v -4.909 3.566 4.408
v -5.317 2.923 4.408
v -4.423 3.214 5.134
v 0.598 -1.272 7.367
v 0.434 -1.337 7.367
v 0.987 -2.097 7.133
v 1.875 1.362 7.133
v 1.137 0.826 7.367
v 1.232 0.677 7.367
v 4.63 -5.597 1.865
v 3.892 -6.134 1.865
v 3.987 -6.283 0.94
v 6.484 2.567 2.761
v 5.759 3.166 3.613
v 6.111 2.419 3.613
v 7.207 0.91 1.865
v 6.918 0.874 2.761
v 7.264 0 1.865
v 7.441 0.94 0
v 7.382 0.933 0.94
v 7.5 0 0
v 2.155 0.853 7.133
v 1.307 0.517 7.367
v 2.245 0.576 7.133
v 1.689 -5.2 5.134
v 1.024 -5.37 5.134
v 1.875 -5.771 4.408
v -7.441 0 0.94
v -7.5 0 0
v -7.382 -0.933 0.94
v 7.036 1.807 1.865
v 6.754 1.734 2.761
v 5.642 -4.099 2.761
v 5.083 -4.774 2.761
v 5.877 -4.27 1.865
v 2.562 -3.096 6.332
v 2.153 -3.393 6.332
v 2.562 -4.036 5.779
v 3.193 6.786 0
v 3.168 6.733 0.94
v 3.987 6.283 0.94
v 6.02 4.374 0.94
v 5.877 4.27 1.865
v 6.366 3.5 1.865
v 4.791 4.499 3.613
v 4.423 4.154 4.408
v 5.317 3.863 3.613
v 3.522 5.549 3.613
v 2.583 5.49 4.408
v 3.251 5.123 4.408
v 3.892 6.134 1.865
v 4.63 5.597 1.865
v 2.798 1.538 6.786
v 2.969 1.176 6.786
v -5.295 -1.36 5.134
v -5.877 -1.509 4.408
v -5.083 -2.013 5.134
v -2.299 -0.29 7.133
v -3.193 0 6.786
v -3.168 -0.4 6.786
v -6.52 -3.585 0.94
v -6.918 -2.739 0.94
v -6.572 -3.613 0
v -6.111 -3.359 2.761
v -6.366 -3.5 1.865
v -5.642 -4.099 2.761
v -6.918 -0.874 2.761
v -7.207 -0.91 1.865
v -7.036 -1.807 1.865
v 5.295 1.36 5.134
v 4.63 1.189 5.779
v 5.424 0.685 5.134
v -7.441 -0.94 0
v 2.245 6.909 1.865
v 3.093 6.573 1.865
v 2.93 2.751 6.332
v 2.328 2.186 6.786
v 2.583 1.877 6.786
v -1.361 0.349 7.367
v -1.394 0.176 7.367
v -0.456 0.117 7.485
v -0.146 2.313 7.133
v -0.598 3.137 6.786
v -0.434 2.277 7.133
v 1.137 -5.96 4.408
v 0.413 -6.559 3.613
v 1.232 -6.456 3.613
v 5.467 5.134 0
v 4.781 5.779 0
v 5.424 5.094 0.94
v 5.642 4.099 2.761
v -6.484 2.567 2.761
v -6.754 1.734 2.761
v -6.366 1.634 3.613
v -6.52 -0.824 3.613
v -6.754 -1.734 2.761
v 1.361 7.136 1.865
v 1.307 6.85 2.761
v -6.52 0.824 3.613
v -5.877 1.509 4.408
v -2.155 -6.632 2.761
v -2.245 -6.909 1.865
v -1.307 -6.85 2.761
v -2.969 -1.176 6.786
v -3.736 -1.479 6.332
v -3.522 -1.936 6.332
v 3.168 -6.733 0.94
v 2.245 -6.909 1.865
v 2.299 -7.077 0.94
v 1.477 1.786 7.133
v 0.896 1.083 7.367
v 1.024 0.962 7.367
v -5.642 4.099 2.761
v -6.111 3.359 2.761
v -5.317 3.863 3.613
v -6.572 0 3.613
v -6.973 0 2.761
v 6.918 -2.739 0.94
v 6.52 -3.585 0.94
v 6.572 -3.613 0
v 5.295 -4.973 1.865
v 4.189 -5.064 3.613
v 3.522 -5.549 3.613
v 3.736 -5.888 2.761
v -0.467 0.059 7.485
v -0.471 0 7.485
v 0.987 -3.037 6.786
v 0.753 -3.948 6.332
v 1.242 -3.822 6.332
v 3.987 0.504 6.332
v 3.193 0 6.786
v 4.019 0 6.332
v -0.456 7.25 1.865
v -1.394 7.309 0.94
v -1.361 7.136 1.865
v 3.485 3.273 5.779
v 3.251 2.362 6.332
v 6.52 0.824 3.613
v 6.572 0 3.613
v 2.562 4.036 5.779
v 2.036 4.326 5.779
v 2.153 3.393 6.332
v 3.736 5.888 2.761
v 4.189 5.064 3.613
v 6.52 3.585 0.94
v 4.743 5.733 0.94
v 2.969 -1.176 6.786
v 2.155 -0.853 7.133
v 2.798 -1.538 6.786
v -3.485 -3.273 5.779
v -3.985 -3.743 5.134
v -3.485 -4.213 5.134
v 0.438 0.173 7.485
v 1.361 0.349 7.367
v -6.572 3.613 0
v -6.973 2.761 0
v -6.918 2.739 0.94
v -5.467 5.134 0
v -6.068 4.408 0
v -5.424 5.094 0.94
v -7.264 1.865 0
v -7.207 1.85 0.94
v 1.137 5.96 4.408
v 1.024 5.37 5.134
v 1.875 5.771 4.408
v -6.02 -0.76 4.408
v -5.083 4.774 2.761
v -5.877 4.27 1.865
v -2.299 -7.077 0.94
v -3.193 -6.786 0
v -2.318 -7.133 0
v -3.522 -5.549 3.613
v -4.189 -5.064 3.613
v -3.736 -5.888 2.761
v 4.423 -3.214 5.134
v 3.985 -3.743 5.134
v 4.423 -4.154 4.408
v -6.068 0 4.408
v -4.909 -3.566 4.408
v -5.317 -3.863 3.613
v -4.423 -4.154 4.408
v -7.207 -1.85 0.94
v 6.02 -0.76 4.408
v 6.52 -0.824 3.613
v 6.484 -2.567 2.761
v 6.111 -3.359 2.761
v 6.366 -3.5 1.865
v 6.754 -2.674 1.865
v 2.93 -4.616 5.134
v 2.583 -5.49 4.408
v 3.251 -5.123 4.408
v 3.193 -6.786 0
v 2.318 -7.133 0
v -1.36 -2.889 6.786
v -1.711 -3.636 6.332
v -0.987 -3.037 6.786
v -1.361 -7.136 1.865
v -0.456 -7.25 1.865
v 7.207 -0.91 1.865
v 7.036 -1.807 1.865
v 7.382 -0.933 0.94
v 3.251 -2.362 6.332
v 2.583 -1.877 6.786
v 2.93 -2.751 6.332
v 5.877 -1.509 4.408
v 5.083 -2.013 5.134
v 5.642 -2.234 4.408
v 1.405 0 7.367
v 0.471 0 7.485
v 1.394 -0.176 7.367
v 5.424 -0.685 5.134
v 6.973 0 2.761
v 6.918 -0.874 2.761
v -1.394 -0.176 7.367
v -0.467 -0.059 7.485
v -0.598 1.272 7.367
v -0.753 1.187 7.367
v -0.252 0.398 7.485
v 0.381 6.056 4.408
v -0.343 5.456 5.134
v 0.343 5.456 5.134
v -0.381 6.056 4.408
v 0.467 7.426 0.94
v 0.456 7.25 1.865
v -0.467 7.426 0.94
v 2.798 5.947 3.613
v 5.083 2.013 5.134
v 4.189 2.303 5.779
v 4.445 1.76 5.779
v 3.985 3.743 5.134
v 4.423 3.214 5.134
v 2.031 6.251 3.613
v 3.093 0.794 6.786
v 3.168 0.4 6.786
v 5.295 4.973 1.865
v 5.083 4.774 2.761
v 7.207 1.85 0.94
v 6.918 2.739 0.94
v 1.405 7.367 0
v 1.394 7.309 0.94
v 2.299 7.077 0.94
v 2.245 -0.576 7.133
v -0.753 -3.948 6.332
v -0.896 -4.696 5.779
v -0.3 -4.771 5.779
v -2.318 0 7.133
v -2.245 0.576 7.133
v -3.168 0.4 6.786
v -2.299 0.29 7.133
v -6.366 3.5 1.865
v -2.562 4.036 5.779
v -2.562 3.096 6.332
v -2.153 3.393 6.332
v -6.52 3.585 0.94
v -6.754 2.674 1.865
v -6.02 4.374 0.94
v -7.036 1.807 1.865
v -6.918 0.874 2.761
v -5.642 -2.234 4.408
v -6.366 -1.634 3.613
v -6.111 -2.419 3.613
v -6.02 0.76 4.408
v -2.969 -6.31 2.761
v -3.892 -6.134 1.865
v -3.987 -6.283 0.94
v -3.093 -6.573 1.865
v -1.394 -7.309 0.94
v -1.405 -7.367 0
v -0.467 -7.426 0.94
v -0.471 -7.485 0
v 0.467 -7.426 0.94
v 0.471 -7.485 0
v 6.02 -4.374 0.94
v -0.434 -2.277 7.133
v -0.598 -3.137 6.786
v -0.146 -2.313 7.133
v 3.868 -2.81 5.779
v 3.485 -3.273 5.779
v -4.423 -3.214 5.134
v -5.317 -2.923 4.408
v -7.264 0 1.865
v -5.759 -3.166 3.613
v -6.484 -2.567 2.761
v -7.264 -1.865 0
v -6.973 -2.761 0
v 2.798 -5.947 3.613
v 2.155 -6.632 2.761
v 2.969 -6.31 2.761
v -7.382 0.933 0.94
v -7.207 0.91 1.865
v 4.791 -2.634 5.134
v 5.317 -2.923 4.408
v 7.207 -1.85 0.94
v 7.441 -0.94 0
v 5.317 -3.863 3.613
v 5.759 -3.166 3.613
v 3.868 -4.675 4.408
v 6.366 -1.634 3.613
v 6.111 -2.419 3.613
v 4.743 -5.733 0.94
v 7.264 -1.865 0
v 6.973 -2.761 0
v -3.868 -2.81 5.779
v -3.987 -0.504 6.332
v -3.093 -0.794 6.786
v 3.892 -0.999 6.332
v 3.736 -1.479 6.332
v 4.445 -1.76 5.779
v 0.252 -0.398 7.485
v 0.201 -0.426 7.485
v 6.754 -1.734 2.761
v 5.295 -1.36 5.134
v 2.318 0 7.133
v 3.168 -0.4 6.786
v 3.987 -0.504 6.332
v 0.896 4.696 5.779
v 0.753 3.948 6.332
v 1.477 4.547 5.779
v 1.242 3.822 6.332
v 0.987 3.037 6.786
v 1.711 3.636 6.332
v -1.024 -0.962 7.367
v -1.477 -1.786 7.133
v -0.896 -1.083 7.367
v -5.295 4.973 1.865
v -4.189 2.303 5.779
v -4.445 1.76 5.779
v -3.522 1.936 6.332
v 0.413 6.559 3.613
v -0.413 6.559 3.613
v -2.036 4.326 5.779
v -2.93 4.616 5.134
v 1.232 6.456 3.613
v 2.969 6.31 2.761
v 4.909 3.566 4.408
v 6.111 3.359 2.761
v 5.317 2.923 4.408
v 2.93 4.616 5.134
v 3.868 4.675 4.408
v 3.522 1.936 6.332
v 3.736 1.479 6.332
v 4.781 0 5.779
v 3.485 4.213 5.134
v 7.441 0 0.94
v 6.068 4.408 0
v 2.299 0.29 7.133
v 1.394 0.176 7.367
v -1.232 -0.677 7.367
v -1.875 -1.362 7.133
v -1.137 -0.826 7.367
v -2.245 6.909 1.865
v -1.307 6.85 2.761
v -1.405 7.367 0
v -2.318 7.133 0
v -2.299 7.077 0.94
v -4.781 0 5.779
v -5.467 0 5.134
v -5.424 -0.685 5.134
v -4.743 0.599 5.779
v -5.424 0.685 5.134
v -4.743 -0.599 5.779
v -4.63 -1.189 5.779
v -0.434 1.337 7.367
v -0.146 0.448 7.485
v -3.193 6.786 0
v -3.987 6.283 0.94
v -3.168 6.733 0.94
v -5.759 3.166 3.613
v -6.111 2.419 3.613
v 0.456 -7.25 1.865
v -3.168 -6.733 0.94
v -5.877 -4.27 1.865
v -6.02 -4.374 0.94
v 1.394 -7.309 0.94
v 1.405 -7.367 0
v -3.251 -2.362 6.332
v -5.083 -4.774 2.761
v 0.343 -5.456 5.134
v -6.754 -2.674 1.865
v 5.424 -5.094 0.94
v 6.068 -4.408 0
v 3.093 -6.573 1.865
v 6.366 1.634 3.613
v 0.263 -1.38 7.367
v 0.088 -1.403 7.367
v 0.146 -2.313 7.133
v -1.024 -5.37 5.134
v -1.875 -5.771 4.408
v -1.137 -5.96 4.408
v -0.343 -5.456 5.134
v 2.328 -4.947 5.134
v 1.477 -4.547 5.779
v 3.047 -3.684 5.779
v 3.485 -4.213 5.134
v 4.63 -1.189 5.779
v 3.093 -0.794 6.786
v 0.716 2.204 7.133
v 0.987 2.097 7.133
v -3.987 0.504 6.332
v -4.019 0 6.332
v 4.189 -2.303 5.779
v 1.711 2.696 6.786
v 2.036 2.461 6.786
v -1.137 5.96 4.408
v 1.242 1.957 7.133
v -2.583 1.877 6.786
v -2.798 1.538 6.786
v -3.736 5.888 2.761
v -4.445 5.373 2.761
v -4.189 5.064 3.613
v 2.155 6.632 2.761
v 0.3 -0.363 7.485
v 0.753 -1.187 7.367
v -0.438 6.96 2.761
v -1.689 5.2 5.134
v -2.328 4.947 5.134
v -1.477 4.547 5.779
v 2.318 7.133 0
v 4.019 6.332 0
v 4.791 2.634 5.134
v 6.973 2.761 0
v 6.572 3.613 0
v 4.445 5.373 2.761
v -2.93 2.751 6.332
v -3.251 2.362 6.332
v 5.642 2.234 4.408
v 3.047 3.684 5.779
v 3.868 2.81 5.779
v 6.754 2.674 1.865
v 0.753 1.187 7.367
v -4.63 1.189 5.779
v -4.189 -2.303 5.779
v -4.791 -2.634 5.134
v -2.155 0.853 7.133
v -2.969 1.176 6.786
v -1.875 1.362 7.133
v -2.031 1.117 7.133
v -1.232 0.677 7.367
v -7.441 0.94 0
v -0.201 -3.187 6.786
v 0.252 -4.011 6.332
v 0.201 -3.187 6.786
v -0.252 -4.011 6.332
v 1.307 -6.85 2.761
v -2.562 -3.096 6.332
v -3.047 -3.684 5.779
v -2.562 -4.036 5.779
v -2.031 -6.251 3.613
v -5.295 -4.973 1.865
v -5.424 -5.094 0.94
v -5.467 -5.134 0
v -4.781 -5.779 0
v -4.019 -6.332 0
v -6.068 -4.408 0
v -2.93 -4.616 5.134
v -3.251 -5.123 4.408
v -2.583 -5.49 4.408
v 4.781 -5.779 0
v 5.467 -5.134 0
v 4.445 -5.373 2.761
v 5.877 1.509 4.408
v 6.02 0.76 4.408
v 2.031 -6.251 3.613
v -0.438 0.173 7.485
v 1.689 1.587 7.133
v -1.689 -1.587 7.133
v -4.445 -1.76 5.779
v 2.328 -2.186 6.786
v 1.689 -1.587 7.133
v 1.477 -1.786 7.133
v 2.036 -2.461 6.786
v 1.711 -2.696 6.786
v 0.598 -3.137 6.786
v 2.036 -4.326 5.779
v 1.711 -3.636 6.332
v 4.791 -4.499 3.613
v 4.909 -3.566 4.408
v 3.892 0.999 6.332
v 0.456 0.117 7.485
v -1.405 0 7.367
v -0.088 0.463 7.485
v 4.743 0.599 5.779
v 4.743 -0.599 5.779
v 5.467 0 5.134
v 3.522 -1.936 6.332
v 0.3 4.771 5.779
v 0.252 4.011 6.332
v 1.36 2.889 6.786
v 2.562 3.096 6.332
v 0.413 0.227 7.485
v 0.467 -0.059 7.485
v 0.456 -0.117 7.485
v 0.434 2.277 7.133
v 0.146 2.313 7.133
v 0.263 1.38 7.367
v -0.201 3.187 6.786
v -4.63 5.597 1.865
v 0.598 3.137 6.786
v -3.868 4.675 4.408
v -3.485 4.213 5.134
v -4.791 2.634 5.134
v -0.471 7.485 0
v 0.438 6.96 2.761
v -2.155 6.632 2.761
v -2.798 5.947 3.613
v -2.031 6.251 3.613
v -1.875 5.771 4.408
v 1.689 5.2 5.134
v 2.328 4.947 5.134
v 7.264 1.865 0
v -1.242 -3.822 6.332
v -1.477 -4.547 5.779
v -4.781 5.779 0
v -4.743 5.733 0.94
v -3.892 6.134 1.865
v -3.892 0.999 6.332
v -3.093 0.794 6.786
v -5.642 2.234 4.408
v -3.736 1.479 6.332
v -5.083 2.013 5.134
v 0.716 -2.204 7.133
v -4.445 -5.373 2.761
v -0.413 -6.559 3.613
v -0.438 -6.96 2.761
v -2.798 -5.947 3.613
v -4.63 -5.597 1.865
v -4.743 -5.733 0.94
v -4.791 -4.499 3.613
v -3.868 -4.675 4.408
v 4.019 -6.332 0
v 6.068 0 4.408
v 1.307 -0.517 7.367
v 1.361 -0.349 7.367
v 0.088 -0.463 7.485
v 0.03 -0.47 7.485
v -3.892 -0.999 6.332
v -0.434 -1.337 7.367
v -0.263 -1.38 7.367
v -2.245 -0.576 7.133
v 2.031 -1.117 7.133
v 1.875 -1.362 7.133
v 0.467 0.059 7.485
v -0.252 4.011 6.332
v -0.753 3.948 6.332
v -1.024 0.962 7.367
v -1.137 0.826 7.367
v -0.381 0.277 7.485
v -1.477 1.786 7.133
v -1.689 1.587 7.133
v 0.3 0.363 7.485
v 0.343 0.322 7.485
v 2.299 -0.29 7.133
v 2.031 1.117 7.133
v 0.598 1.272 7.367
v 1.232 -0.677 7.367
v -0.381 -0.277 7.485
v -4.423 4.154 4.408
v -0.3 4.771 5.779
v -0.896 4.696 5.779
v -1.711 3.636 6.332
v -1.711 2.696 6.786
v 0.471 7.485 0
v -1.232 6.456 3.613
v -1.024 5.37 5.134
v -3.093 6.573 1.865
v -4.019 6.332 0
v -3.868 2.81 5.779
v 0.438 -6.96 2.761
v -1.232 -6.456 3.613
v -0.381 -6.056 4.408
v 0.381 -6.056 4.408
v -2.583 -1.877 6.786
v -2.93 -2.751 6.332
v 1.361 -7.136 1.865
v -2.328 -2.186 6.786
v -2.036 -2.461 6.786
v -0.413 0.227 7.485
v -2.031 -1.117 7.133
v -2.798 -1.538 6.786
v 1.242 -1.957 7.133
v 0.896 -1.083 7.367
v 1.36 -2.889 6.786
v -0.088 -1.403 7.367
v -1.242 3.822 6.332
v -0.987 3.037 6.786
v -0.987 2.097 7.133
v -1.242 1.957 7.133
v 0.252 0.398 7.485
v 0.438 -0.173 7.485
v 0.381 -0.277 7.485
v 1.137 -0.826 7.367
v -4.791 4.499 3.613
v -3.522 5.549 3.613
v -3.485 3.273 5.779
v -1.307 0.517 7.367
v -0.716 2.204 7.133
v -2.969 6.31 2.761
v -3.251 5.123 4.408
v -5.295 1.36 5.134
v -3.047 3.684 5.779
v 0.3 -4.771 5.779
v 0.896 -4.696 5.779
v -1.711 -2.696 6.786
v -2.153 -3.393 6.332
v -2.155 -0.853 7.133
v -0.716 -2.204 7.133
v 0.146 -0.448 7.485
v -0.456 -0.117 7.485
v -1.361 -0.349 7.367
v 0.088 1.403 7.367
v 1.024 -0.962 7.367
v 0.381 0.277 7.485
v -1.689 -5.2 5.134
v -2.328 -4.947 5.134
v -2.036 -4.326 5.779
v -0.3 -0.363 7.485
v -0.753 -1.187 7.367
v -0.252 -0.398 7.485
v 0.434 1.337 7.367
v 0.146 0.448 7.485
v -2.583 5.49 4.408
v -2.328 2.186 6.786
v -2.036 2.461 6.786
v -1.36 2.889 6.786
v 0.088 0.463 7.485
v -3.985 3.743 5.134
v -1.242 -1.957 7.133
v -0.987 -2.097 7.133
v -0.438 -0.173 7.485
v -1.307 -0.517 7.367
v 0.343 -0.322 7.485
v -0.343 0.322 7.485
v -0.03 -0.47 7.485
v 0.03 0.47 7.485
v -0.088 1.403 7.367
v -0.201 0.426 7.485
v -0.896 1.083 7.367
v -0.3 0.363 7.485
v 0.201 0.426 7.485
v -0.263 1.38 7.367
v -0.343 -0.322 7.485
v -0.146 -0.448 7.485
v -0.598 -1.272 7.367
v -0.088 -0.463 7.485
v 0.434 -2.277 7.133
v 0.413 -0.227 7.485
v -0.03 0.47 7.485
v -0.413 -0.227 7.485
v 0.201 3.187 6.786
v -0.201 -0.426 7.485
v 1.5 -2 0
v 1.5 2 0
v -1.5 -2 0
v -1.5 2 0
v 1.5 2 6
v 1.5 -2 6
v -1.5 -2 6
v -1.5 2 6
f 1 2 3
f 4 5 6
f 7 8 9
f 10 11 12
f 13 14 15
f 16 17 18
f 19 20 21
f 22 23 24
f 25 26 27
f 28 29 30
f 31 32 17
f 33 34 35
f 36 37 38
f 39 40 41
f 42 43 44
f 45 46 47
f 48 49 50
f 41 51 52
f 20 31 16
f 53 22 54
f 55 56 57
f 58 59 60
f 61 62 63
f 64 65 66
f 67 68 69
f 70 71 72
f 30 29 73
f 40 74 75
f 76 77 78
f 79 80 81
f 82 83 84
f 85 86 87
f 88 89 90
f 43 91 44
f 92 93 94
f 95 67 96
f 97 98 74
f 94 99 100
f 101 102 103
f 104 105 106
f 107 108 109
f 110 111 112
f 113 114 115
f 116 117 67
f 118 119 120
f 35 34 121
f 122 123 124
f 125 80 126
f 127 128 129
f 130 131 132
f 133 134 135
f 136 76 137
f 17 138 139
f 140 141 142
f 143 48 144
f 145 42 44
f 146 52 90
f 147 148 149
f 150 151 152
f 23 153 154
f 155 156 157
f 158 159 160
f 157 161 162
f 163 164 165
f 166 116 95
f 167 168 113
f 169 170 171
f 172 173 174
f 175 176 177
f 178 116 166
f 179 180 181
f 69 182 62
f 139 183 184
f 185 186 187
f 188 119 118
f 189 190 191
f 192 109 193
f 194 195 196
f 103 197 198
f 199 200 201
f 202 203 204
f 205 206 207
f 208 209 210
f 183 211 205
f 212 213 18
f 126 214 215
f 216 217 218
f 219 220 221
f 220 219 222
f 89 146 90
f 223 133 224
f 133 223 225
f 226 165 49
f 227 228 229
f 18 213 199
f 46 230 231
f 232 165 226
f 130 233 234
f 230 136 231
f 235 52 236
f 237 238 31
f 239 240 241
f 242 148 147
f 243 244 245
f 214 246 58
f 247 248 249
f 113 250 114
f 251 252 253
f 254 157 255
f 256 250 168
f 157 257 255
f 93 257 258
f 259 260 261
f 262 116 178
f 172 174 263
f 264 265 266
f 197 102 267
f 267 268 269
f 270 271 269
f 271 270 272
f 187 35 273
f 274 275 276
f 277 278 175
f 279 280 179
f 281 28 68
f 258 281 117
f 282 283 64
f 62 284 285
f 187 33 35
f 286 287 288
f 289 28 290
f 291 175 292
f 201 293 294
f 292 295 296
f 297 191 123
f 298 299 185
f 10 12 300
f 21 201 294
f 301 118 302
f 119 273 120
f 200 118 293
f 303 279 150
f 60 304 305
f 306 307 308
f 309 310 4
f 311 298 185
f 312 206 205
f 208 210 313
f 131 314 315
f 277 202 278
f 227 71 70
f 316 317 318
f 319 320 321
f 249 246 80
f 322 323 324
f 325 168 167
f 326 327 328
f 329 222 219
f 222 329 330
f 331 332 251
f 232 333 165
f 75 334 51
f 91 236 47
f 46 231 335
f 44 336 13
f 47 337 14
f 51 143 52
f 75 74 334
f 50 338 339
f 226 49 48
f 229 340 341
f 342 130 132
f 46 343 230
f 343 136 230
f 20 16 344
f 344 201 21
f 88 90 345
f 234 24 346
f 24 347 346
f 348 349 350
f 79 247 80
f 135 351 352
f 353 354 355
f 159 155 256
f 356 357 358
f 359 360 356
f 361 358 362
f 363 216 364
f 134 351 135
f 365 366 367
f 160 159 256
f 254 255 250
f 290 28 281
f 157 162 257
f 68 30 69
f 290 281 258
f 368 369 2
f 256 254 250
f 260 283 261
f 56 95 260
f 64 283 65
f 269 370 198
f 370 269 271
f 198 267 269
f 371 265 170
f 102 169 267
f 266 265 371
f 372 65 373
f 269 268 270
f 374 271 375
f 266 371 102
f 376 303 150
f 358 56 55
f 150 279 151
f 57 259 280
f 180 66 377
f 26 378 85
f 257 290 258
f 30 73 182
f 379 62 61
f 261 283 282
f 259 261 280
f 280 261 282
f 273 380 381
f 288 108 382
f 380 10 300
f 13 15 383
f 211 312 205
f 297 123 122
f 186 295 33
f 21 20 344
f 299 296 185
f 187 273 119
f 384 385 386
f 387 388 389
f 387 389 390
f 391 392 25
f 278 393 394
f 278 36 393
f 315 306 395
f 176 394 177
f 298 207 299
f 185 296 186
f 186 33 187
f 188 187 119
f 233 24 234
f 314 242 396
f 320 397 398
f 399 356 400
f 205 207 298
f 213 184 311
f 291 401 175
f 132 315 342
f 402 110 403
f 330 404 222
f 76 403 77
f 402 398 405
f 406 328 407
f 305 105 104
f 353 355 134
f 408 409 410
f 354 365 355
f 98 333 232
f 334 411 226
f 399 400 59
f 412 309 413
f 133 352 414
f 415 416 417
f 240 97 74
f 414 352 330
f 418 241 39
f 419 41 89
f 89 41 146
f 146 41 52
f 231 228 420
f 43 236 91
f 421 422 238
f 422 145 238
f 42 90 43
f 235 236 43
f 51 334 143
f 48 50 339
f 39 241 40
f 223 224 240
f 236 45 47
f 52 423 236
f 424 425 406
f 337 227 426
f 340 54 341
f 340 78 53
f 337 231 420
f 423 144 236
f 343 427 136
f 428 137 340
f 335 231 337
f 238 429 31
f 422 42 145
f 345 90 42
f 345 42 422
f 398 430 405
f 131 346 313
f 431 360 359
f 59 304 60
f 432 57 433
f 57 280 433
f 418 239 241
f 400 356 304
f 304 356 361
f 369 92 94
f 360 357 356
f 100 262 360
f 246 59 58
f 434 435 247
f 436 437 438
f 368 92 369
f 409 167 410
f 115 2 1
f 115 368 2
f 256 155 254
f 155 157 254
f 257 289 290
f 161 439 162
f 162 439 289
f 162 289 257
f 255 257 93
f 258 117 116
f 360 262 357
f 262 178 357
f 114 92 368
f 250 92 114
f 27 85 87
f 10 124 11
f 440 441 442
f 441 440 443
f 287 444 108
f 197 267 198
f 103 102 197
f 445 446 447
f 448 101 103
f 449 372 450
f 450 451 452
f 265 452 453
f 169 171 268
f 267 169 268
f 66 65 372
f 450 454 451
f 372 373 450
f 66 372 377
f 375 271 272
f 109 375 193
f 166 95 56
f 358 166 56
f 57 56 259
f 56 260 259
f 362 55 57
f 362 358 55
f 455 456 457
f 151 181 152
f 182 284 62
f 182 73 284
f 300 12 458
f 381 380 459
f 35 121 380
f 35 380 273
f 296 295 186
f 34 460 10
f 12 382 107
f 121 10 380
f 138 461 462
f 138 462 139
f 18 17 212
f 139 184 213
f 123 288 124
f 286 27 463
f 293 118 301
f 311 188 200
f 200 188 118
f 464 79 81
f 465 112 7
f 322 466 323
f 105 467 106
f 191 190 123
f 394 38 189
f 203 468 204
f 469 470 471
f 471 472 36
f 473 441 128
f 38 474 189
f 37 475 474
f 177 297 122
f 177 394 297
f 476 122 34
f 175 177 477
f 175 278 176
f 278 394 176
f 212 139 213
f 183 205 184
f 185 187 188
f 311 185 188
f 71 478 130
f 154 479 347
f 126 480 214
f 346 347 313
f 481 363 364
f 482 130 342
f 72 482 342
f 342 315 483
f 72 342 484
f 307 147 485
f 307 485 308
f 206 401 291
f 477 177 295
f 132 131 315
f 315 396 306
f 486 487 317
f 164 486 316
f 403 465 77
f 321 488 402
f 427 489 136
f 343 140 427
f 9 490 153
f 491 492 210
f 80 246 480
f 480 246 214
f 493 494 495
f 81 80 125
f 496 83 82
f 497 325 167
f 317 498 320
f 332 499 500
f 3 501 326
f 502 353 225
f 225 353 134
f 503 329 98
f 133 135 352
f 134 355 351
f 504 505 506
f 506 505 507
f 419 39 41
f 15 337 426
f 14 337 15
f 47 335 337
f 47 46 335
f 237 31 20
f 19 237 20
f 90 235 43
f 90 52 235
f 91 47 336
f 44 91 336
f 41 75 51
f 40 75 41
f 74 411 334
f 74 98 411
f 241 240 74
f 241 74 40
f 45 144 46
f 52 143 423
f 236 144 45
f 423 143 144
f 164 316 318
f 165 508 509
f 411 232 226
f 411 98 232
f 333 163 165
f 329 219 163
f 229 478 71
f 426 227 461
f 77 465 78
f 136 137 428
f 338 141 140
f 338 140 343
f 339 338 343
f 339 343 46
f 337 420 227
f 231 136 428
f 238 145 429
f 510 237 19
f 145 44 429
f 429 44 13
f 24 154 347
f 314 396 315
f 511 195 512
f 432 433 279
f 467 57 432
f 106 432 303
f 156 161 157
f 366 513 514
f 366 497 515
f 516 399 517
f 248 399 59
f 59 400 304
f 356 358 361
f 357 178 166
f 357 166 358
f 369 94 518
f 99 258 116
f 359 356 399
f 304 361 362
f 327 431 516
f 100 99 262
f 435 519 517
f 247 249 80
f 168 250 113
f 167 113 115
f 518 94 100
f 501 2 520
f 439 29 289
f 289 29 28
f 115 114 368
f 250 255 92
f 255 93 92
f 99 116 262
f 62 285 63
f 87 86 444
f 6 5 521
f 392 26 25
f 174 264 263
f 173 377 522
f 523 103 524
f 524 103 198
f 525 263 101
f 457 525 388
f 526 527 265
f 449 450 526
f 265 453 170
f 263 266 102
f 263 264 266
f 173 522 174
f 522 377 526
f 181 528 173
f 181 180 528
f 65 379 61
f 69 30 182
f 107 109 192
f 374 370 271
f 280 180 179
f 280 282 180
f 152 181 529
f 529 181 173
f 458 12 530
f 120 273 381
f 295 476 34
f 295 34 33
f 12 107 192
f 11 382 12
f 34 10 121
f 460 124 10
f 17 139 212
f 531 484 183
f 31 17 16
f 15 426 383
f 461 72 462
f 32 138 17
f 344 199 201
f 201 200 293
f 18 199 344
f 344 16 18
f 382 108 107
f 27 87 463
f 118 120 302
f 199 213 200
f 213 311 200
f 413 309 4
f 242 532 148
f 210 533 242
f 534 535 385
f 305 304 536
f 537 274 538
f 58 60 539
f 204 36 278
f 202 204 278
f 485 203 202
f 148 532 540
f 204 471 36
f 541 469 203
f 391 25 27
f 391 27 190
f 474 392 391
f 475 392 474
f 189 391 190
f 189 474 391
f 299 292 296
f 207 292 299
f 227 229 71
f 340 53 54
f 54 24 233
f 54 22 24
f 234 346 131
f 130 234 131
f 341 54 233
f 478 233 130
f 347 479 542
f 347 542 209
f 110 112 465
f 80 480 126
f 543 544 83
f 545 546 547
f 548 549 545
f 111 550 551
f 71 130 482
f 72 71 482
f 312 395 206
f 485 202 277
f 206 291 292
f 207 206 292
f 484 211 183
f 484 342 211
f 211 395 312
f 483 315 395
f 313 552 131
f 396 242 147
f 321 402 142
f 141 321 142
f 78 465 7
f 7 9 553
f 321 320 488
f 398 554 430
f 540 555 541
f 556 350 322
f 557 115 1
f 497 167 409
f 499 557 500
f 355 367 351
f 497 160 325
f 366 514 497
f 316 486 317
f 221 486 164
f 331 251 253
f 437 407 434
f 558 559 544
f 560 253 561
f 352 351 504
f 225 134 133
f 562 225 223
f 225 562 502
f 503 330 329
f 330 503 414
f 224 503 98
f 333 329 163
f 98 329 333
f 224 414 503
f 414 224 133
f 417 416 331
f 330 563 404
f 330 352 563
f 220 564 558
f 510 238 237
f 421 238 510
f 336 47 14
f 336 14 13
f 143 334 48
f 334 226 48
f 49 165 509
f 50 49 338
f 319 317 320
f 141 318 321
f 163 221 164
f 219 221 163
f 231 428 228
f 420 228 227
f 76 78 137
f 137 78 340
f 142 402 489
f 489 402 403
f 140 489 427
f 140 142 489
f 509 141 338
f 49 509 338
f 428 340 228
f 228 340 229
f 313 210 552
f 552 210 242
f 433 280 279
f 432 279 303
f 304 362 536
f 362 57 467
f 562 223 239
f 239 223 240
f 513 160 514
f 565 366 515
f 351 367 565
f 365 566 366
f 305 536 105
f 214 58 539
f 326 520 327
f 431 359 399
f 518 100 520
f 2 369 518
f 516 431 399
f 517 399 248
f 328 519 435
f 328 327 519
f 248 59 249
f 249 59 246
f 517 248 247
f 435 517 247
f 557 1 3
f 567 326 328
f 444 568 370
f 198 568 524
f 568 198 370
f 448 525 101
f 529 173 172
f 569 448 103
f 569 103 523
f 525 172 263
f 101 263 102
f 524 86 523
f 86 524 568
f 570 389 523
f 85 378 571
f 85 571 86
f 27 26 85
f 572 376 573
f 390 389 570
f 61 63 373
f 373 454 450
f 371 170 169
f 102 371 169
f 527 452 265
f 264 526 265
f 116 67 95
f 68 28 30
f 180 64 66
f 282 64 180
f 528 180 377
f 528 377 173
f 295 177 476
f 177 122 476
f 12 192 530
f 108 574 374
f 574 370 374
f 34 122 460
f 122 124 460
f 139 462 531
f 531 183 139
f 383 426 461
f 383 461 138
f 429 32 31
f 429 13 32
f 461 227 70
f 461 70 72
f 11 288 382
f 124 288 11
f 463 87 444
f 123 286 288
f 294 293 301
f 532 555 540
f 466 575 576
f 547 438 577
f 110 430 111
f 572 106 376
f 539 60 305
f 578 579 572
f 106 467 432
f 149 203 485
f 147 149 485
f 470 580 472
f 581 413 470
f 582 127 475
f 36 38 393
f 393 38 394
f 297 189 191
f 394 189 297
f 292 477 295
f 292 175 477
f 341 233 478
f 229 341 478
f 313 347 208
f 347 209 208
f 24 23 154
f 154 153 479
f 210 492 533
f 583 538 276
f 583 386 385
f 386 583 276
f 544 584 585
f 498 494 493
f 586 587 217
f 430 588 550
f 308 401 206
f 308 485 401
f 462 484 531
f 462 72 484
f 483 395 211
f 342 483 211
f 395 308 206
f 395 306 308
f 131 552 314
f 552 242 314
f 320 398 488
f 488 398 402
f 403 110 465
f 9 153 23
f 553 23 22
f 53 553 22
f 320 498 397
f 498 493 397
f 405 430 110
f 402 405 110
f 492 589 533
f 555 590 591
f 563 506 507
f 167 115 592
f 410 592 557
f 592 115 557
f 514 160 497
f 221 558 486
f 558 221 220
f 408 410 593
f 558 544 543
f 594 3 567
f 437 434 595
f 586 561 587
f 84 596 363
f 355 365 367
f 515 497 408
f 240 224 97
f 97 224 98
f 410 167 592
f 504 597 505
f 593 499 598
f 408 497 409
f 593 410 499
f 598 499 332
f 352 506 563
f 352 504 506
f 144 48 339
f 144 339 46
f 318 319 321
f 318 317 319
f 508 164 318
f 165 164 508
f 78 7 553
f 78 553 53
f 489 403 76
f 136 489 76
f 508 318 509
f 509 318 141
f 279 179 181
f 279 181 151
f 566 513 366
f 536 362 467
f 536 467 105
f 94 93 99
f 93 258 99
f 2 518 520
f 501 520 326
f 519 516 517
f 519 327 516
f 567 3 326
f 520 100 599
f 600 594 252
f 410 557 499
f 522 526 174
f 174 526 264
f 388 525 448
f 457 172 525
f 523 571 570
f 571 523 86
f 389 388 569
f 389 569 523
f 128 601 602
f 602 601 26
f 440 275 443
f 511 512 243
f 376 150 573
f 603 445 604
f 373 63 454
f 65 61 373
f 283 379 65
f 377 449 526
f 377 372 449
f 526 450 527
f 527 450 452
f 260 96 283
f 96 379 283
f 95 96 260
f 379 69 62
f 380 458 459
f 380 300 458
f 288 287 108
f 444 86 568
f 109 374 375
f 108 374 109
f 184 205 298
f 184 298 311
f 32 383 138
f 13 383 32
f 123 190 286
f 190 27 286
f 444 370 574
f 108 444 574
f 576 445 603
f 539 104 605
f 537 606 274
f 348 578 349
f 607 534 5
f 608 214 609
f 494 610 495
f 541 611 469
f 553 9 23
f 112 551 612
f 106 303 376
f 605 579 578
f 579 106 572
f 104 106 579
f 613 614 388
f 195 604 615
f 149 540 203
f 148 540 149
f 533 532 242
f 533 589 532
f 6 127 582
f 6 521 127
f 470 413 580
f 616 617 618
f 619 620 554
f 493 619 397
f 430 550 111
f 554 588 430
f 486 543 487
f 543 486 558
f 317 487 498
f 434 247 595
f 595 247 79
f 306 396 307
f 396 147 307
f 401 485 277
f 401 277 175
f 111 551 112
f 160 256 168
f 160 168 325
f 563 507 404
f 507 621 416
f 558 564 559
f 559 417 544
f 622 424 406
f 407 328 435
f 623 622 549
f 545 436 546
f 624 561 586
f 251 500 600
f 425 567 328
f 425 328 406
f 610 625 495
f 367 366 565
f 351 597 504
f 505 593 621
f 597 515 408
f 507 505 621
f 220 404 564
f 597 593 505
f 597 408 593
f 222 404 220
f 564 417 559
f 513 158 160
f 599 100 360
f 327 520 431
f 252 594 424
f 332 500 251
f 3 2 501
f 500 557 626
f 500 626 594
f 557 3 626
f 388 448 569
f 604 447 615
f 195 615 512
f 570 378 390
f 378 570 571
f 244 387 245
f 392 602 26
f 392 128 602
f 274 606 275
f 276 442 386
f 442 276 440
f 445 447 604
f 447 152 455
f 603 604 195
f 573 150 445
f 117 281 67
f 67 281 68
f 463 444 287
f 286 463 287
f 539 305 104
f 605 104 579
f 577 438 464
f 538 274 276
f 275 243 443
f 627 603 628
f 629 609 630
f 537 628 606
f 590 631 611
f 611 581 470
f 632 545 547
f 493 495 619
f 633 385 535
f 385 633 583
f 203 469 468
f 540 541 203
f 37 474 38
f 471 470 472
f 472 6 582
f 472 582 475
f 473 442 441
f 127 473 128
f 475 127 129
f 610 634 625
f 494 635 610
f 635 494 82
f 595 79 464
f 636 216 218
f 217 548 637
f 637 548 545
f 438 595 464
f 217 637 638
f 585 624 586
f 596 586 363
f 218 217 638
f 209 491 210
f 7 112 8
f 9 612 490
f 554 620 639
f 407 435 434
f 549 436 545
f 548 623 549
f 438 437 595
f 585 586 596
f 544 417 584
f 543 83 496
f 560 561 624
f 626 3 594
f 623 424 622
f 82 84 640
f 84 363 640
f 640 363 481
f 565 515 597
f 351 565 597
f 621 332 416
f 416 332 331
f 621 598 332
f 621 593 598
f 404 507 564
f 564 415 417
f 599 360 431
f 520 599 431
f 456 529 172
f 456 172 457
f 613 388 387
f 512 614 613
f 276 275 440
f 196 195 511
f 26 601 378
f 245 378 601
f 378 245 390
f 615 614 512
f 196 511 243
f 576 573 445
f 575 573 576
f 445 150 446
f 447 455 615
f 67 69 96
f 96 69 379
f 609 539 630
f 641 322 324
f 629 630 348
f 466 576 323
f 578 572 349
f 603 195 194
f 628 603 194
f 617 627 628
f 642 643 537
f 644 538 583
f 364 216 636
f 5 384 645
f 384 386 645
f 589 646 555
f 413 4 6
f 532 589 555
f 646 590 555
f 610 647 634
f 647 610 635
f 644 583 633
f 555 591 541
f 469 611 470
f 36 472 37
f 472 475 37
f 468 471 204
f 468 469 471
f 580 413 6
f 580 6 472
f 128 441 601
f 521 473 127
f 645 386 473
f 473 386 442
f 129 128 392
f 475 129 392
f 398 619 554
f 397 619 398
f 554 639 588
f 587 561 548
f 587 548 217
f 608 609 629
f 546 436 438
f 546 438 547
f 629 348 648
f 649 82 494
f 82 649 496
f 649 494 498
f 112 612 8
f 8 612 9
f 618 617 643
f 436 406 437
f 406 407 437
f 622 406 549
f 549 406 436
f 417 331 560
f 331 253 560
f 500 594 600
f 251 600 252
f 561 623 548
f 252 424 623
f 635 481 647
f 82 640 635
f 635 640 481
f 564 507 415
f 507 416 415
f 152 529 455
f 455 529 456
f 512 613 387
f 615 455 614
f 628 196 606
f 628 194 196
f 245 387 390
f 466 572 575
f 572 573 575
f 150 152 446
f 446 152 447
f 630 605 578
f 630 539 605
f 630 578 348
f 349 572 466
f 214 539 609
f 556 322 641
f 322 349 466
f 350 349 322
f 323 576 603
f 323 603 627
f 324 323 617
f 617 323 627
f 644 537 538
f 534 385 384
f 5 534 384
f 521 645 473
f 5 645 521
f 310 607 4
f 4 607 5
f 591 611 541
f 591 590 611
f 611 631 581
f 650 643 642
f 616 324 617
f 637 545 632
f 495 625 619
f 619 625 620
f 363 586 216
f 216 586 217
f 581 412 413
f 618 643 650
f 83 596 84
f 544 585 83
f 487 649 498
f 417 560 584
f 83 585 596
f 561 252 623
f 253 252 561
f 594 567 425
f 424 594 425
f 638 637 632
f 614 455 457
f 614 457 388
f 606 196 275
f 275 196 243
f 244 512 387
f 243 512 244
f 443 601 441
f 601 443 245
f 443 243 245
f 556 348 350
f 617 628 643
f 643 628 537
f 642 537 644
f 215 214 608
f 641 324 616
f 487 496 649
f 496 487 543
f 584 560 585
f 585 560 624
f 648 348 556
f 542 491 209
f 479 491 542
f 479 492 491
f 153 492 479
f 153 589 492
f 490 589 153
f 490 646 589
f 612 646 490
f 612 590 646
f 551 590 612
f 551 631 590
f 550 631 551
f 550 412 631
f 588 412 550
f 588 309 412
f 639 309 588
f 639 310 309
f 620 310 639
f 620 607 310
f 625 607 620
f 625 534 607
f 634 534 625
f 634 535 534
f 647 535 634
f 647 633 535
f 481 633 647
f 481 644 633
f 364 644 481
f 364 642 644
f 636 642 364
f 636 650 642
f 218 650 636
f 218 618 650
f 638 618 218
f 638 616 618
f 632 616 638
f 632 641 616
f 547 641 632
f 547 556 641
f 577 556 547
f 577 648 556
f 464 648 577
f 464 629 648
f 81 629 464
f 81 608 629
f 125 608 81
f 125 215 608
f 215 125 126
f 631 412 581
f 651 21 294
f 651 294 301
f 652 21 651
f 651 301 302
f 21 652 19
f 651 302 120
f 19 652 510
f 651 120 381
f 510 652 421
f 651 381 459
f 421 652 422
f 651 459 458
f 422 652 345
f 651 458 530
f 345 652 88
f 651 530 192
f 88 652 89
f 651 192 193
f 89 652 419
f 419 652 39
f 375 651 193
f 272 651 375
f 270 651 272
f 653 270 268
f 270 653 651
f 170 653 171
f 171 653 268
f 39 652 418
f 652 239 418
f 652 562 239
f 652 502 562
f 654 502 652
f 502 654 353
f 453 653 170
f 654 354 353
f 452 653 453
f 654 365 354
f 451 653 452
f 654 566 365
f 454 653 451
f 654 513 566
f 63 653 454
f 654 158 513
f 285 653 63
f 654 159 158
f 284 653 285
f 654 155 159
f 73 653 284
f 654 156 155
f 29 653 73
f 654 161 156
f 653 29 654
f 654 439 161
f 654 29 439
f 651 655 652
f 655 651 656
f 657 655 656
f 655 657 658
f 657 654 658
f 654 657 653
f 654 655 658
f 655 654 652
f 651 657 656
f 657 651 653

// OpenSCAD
///////////////////
///   GO CASE   ///
///
/// Designed by Chris Caswell
///  3D Central 
///  info@3dcentralva.com
/// 
/// Intention is for this project to be Open Hardware
///  http://www.oshwa.org/definition/


// This is where you put the length of your phone, in millimeters
phone_l = 139.1;
// This is where you put the width of your phone, in millimeters
phone_w = 68.5; // Add ~3mm tolerance to your measurements to account for buttons
// This is where you put the thickness of your phone, in millimeters
phone_d = 7.8;
// This measures where the camera window starts, from left to right, in millimeters
camera_x = 10.2; // Measuring from the top left of phone, to the top left corner of where camera hole should be
// This measures where the camera window starts, from top to bottom, in millimeters
camera_y = 2.6; // "X" measuring left to right, "Y" measuring up and down
// This measures the width of the camera window from left to right, in millimeters
camera_w = 22; // Width and Length of camera hole
// This measures the length of the camera window from top to bottom, in millimeters
camera_l = 8;
// This determines the width of the aimer! It will also change the cutout in the cover. Cool, right?
aimer_w = 15; // width of finger aimer
// You can put your custom text here, and it will appear on the bottom interior of the case
custom_text = "iPhone 6";


part = "button"; // [case_top:Case Top,case_bottom:Case Bottom,case_lid:Case Lid,lock_pin:Latching slide switch,button:Button,aimer_hinge:Aimer Hinge,hinge_pin:Hinge Pin]

if(part == "assembly") {
    assembly();
}
else if(part == "aimer_hinge") {
    aimer_hinge(is_open = true);
}
else if(part == "case_top") {
    translate([0,0,phone_l/2+rounding+wall_th/2]) rotate([-90,0,0]) case_top();
}
else if(part == "case_bottom") {
    translate([0,0,phone_l/2+rounding+wall_th/2]) rotate([90,0,0]) case_bottom();
}
else if(part == "case_lid") {
    translate([0,0,13]) rotate([0,180,0]) case_lid();
}
else if(part == "hinge_pin") {
    hinge_pin();
}
else if(part == "lock_pin") {
    translate([0,0,1]) rotate([0,-90,0]) lock_pin();
}
else if(part == "button") {
    button();
}


/* [Hidden] */

// General Parameters
wall_th = 3;
rounding = 2; // minkowski rounding
phone_tol = 0.3; // extra spacing around phone
$fn = 30; // smoothness
volume_l = 30; // Originally location of slot for volume controls
volume_y = 10; // Now 
button_d = 15;
throw_dist = 10; // distance slide switch moves

// Hinge Parameters
pin_l = 30;
pin_d = 8;
tol = 0.35; // tolerance on hinge

// Global constants
sqrt2 = 1.41421356237;
magnet_d = 7;
magnet_h = 2.5;


// All components, in the right place relative to one another
module assembly() {
    //translate([0,-throw_dist,0]) 
    union() {
    translate([-phone_w/2+2-1,phone_l/2-button_d-wall_th+throw_dist-3.5-2,phone_d/2+wall_th*3-5.5])  lock_pin();
    translate([-phone_w/2+2-1+3,phone_l/2-button_d-wall_th+throw_dist+1-2,phone_d/2+wall_th*3-5.5+5])  button();
    }
    //intersection() {
    case_top();
  // translate([-phone_w/2+2-1,phone_l/2-15+4,phone_d/2+wall_th*3-5.5+4]) cube([30,30,80], center=true);
    //}
    //translate([0,-5,0]) 
    case_bottom();
    translate([phone_w+pin_l+pin_d+wall_th,0,15]) rotate([0,180,0]) translate([-1,0,0]) 
    translate([0,0,-1+10]) case_lid();
    translate([phone_w/2+pin_l*3/4-1.5,pin_d*4.5,-pin_d/2]) rotate([0,0,0]) hinge_pin();
    translate([phone_w/2+pin_l*3/4-1.5,-pin_d*6,-pin_d/2]) rotate([0,0,0]) hinge_pin();
    translate([phone_w/2+pin_l*3/4-1.5,-pin_d*0,-pin_d/2]) rotate([0,0,180]) 
    aimer_hinge(is_open = true);
    //lock_pin();
    //translate([10,0,0])  lock_pin_hole();
}


// Main phone case module, where the phone sits
module phone_case() {
    echo (custom_text);
    difference() {
        minkowski() {
            translate([pin_l/6-magnet_d/2,0,wall_th/2-wall_th/2]) 
                cube([phone_w+wall_th+pin_l/3+magnet_d/2, phone_l+wall_th, phone_d+wall_th*4], center=true);
            sphere(r=rounding);
        }
        // main phone cavity
        translate([0,0,0]) cube([phone_w+phone_tol, phone_l+phone_tol, phone_d+phone_tol*2+1], center=true);
        // lock pin hole
        //translate([-phone_w/2+2-1,phone_l/2-throw_dist*2,phone_d/2+wall_th*3-5.5]) lock_pin_hole();
        translate([-phone_w/2+2-1+3,phone_l/2-volume_l/2+throw_dist/2-4,phone_d/2+wall_th*3-5.5+0.25]) lock_pin_hole();
        // camera hole
        translate([phone_w/2-camera_x-camera_w/2,phone_l/2-camera_y-camera_l/2,-phone_d*4]) 
            cube([camera_w,camera_l,phone_d*8],center=true);
        difference() {
            translate([phone_w/2-camera_x-camera_w/2,phone_l/2-camera_y-camera_l,-phone_d*4]) // taper
                rotate([0,0,45]) cube([camera_w*sqrt2/2,camera_w*sqrt2/2,phone_d*8],center=true);
            translate([phone_w/2-camera_x-camera_w/2,phone_l/2-camera_y,-phone_d*4]) 
                cube([camera_w,camera_l*2,phone_d*10],center=true);
        }
        // power plug
        translate([0,-phone_l/2,phone_d-wall_th*0.5]) cube([20,20,phone_d*2.5], center=true);
        // volume buttons
        translate([-phone_w/2-20/2,phone_l/2-volume_y-volume_l,phone_d-wall_th*2]) 
            cube([20,volume_l,phone_d*4], center=true) ;
        // hinge pin holes
        translate([phone_w/2+pin_l*3/4-2,pin_d*4.5,-pin_d/2]) hinge_pin_holes();
        translate([phone_w/2+pin_l*3/4-2,-pin_d*0,-pin_d/2]) rotate([0,0,180])  hinge_pin_holes();
        translate([phone_w/2+pin_l*3/4-2,-pin_d*6,-pin_d/2]) hinge_pin_holes();
        // magnet holes
        translate([-phone_w/2-magnet_d*0.66,0,2]) cylinder(r=magnet_d/2,h=magnet_h,center=true);
        translate([-phone_w/2-magnet_d*0.66,-phone_l/3,2]) cylinder(r=magnet_d/2,h=magnet_h,center=true);
        // code for 45 degree angle cutaway at top of phone, and top
        translate([0,0,1]) 
        union() {
            translate([0,-phone_l/2-volume_y-volume_l/2,(10+wall_th)/2]) 
                cube([phone_w*2,phone_l*2,phone_d+2], center=true);
            translate([-phone_w/2+button_d*1.5+2.5,phone_l/2-button_d*1.5-wall_th+3,(10+wall_th*3)/2]) 
                rotate([0,0,55])
                cube([button_d*sqrt2+2,button_d*sqrt2+2,phone_d*2+3], center=true);
            translate([button_d*2,phone_l/2-26.5,(10+wall_th)/2]) 
                cube([phone_w+wall_th*4+rounding*2,40,phone_d+2], center=true);
        }
        translate([0,-phone_l/2+10,-phone_d])  linear_extrude(4) text(custom_text,halign="center",valign="center");
    }       
}


// Magnetic latching lid which clamshells over phone
module case_lid() {
    intersection () {
        difference() {
            // main outer case
            minkowski() {
                translate([pin_l/6-magnet_d/2,0,0]) 
                    cube([phone_w+wall_th+pin_l/3+magnet_d/2, phone_l+wall_th, 12+wall_th*3], center=true); // 12 from 13
                sphere(r=rounding);
            }
            // main phone cavity
            cube([phone_w+phone_tol, phone_l+phone_tol, phone_d], center=true);
            // hinge pin holes
           translate([phone_w/2+pin_l*3/4-2,pin_d*4.5,13/2+3])  rotate([0,180,0]) hinge_pin_holes();
           translate([phone_w/2+pin_l*3/4-2,-pin_d*6,13/2+3]) rotate([0,180,0]) hinge_pin_holes();
            // magnet holes
            translate([-phone_w/2-magnet_d*0.66,0,4.5]) cylinder(r=magnet_d/2,h=magnet_h,center=true);
            translate([-phone_w/2-magnet_d*0.66,-phone_l/3,4.5]) cylinder(r=magnet_d/2,h=magnet_h,center=true);
            // aimer shape
            translate([0,0,6]) aimer_hole(4);
            // lock pin
            translate([-phone_w/2+2-1+3,phone_l/2-volume_l/2+throw_dist/2-4,(13+wall_th*3)*3/8]) lock_pin_hole();
            //translate([-phone_w/2+2-1,phone_l/2-throw_dist*2+3,(13+wall_th*3)*3/8]) lock_pin_hole();
        }
        
        // intersect for only lid
        translate([0,0,2]) 
        union() {
            translate([0,-phone_l/2-volume_y-volume_l/2,(10+wall_th)/2]) 
                cube([phone_w*2,phone_l*2,phone_d+2], center=true);
            translate([-phone_w/2+button_d*1.5+2.5,phone_l/2-button_d*1.5-wall_th+3,(10+wall_th*3)/2]) 
                rotate([0,0,55])
                cube([button_d*sqrt2+2,button_d*sqrt2+2,phone_d*sqrt2+4.2], center=true);
            translate([button_d*2,phone_l/2-26.5,(10+wall_th)/2]) 
                cube([phone_w+wall_th*4+rounding*2,40,phone_d+2], center=true);
        }
    }   
}

// Split phone case into two parts for printing vertically
module phone_case_lid_top() {
    intersection() {
        phone_case_lid();
        phone_cut();
    }
}
module phone_case_lid_bottom() {
    difference() {
        phone_case_lid();
        phone_cut();
    }
}

// Still a work in progress, but to do the same for the lid
module case_top() {
    intersection() {
        phone_case();
        phone_cut();
    }
}
module case_bottom() {
    difference() {
        phone_case();
        phone_cut();
    }
}
// Geometry to cut phone case in half for easier printing - using intersection and difference
module phone_cut() {
    anglecut_w = phone_l/4*sqrt2;
    difference() {
        union() {
            translate([0,phone_l/4+phone_l/2-volume_y-volume_l/2-volume_l,0]) 
                cube([phone_w*2,phone_l/2,phone_d*4], center=true);
            translate([phone_w,phone_l/4,0])
                cube([phone_w*2,phone_l/2,phone_d*4], center=true);   
            translate([0,phone_l/4,0]) rotate([0,0,45])  
                cube([anglecut_w,anglecut_w,phone_d*4], center=true);   
        }
        translate([0,0,-4-wall_th/3-4]) difference() {
            union() {
                translate([0,phone_l/4+phone_l/2-volume_y-volume_l/2-volume_l,0]) 
                    cube([phone_w*2,phone_l/2,wall_th/3], center=true);
                translate([phone_w,phone_l/4,0])
                    cube([phone_w*2,phone_l/2,wall_th/3], center=true);   
                translate([0,phone_l/4,0]) rotate([0,0,45])  
                    cube([anglecut_w,anglecut_w,wall_th/3], center=true);   
            }
            translate([0,wall_th,-2]) union() {
                translate([0,phone_l/4+phone_l/2-volume_y-volume_l/2-volume_l,0]) 
                    cube([phone_w*2,phone_l/2,phone_d*3], center=true);
                translate([phone_w,phone_l/4,0])
                    cube([phone_w*2,phone_l/2,phone_d*3], center=true);   
                translate([0,phone_l/4,0]) rotate([0,0,45]) 
                    cube([anglecut_w,anglecut_w,phone_d*4], center=true);   
            }
        }
    }
}



// Slide in pin for latching lid shut
module lock_pin() {
    $fn=50;
    pin_d = 5;
    pin_l = 15;
    lock_pin_w = 3-0.4;
    lock_pin_l = throw_dist+lock_pin_w;
    
    difference() {
        union() {
            translate([0,3/2,0]) cube([lock_pin_w,lock_pin_l+3,4], center=true);
            translate([0,throw_dist/2-0.5,pin_l/4]) cube([lock_pin_w,4,pin_l/2], center=true);
            difference() { // sphere latch
                translate([0,-throw_dist/2+1,0]) scale([0.85,1,1]) sphere(r=2,center=true);
                translate([-pin_d*2,0,0]) cube([pin_d*4,pin_d*4,pin_d*4], center=true);
            }
        }
        
        // angular cuts
        translate([0,throw_dist/2+2+3,-2]) rotate([45,0,0]) cube([10,3,3], center=true);
        translate([0,-throw_dist/2-2,-2]) rotate([-45,0,0]) cube([10,3,3], center=true);
    }
}

module button() {
    $fn=50;
    lock_pin_l = 18;
    lock_pin_w = 3;
    difference() {
        sphere(r=button_d/2, center=true);
        translate([0,0,-button_d*2]) cube([button_d*4,button_d*4,button_d*4], center=true);
        translate([0,0,-pin_l/4+3]) cube([lock_pin_w,4,pin_l/2+6], center=true);
    }
}

// slightly different from lock_pin, to adjust for tolerance in the hole
module lock_pin_hole() {
    $fn=50;
    pin_d = 5;
    pin_l = 15;
    lock_pin_l = 18+0.3;
    lock_pin_w = 3+0.05;
    translate([0,2-throw_dist/2,0]) cube([lock_pin_w,lock_pin_l+throw_dist*1.2,4.2], center=true);
    translate([0,pin_l/2-4/2-throw_dist/2,pin_l/4]) cube([lock_pin_w,4+throw_dist,pin_l/2], center=true);
    translate([0,-pin_l/3+1.5,0]) sphere(r=2,center=true);
    translate([0,-pin_l/3-throw_dist+1.5,0]) sphere(r=2,center=true);
}

// Print in place hinge 
module hinge_pin() {
    assembled_hinge_pin_out();
    translate([0,pin_l/3,0]) rotate([0,0,180]) assembled_hinge_pin_in();
}

// rotated to display hinge in closed form
module full_hinge_closed() {
    translate([0,0,pin_d*3/2]) rotate([0,180,0]) assembled_hinge_pin_out();
    translate([0,pin_l/3,0]) rotate([0,0,180]) assembled_hinge_pin_in();
}

// Hinge with additional aimer component
module aimer_hinge(pin_d=8, length=30, is_open = false) {
     difference() {
        union() {
            translate([0,-pin_l/3,pin_d/2+2]) rotate([90,0,0]) cylinder(r=pin_d/2+2, h=pin_l/3-tol, center=true);
            translate([0,pin_l/3,pin_d/2+2]) rotate([90,0,0]) cylinder(r=pin_d/2+2, h=pin_l/3-tol, center=true);
            translate([pin_l/3/2,0,pin_d/4]) cube([pin_l/3-2,pin_l*3/3-tol,pin_d/2], center=true);
            translate([pin_l/8,pin_l/3,pin_d/4]) scale([1,1,0.69]) rotate([0,90,0]) rotate([0,0,90]) 
                pin(h=pin_l/2,r=pin_d/2);
            translate([pin_l/8,-pin_l/3,pin_d/4]) scale([1,1,0.69]) rotate([0,90,0]) rotate([0,0,90]) 
                pin(h=pin_l/2,r=pin_d/2);
        }
            translate([0,0,pin_d/2+1]) rotate([90,0,0]) cylinder(r=pin_d/2+2, h=pin_l/3+tol, center=true);    
            translate([pin_d/4,0,pin_d/2]) cube([pin_d/2, pin_l/3+tol, 20], center=true);
    }
    // hinge part
    translate([0,pin_l/8+tol/2,pin_d/2+2]) rotate([90,0,0]) cylinder(r1=pin_d/2+2, r2=0, h=pin_l/12, center=true);
    translate([0,-pin_l/8-tol/2,pin_d/2+2]) rotate([0,0,180]) rotate([90,0,0]) 
        cylinder(r1=pin_d/2+2, r2=0, h=pin_l/12, center=true);
    
    //translate([0,0,pin_d+4]) rotate([0,180,0]) // is_open
    translate([0,pin_l/3,0])rotate([0,0,180]) 
    difference() {
        union() { // hinge code
            translate([0,pin_l/3,pin_d/2+2]) rotate([90,0,0]) cylinder(r=pin_d/2+2, h=pin_l/3-tol, center=true);
            // aimer arm
            translate([pin_l/4+phone_w/4+pin_d/4+1.5-aimer_w/2,pin_l/3,4/2]) 
                cube([pin_l/2+phone_w/2+pin_d/2+3-aimer_w*0.5,pin_l/3-tol*4,4], center=true);
            // plus aimer shape
            translate([phone_w/2+pin_l/2+pin_d/2+1.5,pin_l/3,4/2]) aimer_shape(4); 
        }
            translate([0,0,pin_d/2+2]) rotate([90,0,0]) cylinder(r=pin_d/2+2, h=length/3+tol, center=true);      
            translate([pin_d/4,0,pin_d/2+2]) cube([pin_d/2+2, length/3+tol, 20], center=true);   
            // hinge part
            translate([0,length/8+length/12+tol/2,pin_d/2+2]) rotate([0,0,180]) rotate([90,0,0])
                cylinder(r1=pin_d/2+2, r2=0, h=length/12, center=true);
            translate([0,-length/8-length/12-tol/2,pin_d/2+2])  rotate([90,0,0]) 
                cylinder(r1=pin_d/2+2, r2=0, h=length/12, center=true);
            translate([0,length/2-length/24-tol/2,pin_d/2+2]) rotate([90,0,0]) 
                cylinder(r1=pin_d/2+2, r2=0, h=length/12, center=true);   
    } 
}


// Oval shape of aimer, added to a hinge
module aimer_shape(th=4) {
    aimer_offset = 7; // lower number will have aimer extend beyond bottom further
    difference() {
        union() {
            translate([0,phone_l/4+aimer_offset,0]) cylinder(r=aimer_w*3/4, h=th, center=true);
            translate([0,-phone_l/2+aimer_offset,0]) cylinder(r=aimer_w*3/4, h=th, center=true);
            translate([0,-phone_l/8+aimer_offset,0]) cube([aimer_w*3/4*2,phone_l*3/4,th], center=true);
        }
            translate([0,phone_l/4+aimer_offset,0]) cylinder(r=aimer_w/2, h=th*2, center=true);
            translate([0,-phone_l/2+aimer_offset,0]) cylinder(r=aimer_w/2, h=th*2, center=true);
            translate([0,-phone_l/8+aimer_offset,0]) cube([aimer_w,phone_l/4+phone_l/2,th*2], center=true);
    }
}

// Outline of aimer component, to be subtracted from lid
module aimer_hole(th=4) {
    aimer_offset = 7; // lower number will have aimer extend beyond bottom further
    union() {
        translate([0.5,phone_l/4+aimer_offset,0]) cylinder(r=aimer_w*3/4+1, h=th*2, center=true);
        translate([0.5,-phone_l/2+aimer_offset,0]) cylinder(r=aimer_w*3/4+1, h=th*2, center=true);
        translate([0.5,-phone_l/8+aimer_offset,0]) cube([aimer_w*3/4*2+2,phone_l/4+phone_l/2+2,th*2], center=true);
        //attachment peg
        translate([phone_l/2/2,0,0]) cube([phone_l/2+2,11,th*2], center=true);
    }
}

// Hole
module hinge_pin_holes(pin_d=8, length=30)  {
    union() {
        translate([length/8,length/3,pin_d/4]) scale([1,1,0.69]) rotate([0,90,0]) rotate([0,0,90]) 
            pinhole(h=length/2,r=pin_d/2, fixed=true);
        translate([length/8,-length/3,pin_d/4]) scale([1,1,0.69]) rotate([0,90,0]) rotate([0,0,90]) 
            pinhole(h=length/2,r=pin_d/2, fixed=true);
    }
    translate([0,length/3,0]) 
    rotate([0,0,180]) 
    union() {
        translate([length/8,length/3,pin_d/4]) scale([1,1,0.69]) rotate([0,90,0]) rotate([0,0,90]) 
            pinhole(h=length/2,r=pin_d/2, fixed=true);
        translate([length/8,-length/3,pin_d/4]) scale([1,1,0.69]) rotate([0,90,0]) rotate([0,0,90]) 
            pinhole(h=length/2,r=pin_d/2, fixed=true);
    }
}

// Hinge helper functions
module assembled_hinge_pin_out(pin_d=8, length=30) {
    difference() {
        union() {
            translate([0,-length/3,pin_d/2+2]) rotate([90,0,0]) cylinder(r=pin_d/2+2, h=length/3-tol, center=true);
            translate([0,length/3,pin_d/2+2]) rotate([90,0,0]) cylinder(r=pin_d/2+2, h=length/3-tol, center=true);
            translate([length/3/2,0,pin_d/4]) cube([length/3-2,length*3/3-tol,pin_d/2], center=true);
            translate([length/8,length/3,pin_d/4]) scale([1,1,0.69]) rotate([0,90,0]) rotate([0,0,90]) 
                pin(h=length/2,r=pin_d/2);
            translate([length/8,-length/3,pin_d/4]) scale([1,1,0.69]) rotate([0,90,0]) rotate([0,0,90]) 
                pin(h=length/2,r=pin_d/2);
        }
            translate([0,0,pin_d/2+1]) rotate([90,0,0]) cylinder(r=pin_d/2+2.3, h=length/3+tol, center=true);    
            translate([pin_d/4,0,pin_d/2]) cube([pin_d/2, length/3+tol, 20], center=true);
    }
    // hinge part
    translate([0,length/8+tol/2,pin_d/2+2]) rotate([90,0,0]) cylinder(r1=pin_d/2+2, r2=0, h=length/12, center=true);
    translate([0,-length/8-tol/2,pin_d/2+2]) rotate([0,0,180]) rotate([90,0,0]) 
        cylinder(r1=pin_d/2+2, r2=0, h=length/12, center=true);
    translate([0,length/2+length/24-tol/2,pin_d/2+2])  rotate([0,0,180]) rotate([90,0,0]) 
        cylinder(r1=pin_d/2+2, r2=0, h=length/12, center=true);
}

module assembled_hinge_pin_in(pin_d=8, length=30) {
    difference() {
        union() {
            translate([0,-length/3,pin_d/2+2]) rotate([90,0,0]) cylinder(r=pin_d/2+2, h=length/3-tol, center=true);
            translate([0,length/3,pin_d/2+2]) rotate([90,0,0]) cylinder(r=pin_d/2+2, h=length/3-tol, center=true);
            translate([length/3/2,0,pin_d/4]) cube([length/3-2,length*3/3-tol,pin_d/2], center=true);
            translate([length/8,length/3,pin_d/4]) scale([1,1,0.69]) rotate([0,90,0]) rotate([0,0,90]) 
                pin(h=length/2,r=pin_d/2);
            translate([length/8,-length/3,pin_d/4]) scale([1,1,0.69]) rotate([0,90,0]) rotate([0,0,90]) 
                pin(h=length/2,r=pin_d/2);
        }
            translate([0,0,pin_d/2+2]) rotate([90,0,0]) cylinder(r=pin_d/2+2.3, h=length/3+tol, center=true);      
            translate([pin_d/4,0,pin_d/2+2]) cube([pin_d/2+2, length/3+tol, 20], center=true);   
        // hinge part

        translate([0,length/8+length/12+tol/2,pin_d/2+2]) rotate([0,0,180]) rotate([90,0,0])
            cylinder(r1=pin_d/2+2, r2=0, h=length/12, center=true);
        translate([0,-length/8-length/12-tol/2,pin_d/2+2])  rotate([90,0,0]) 
            cylinder(r1=pin_d/2+2, r2=0, h=length/12, center=true);
        translate([0,length/2-length/24-tol/2,pin_d/2+2]) rotate([90,0,0]) 
            cylinder(r1=pin_d/2+2, r2=0, h=length/12, center=true);   
    } 
}

module hinge_hole(){
    translate([0,pin_l/2,pin_d/2]) 
    union() {
        rotate([90,0,0]) pinhole(h=pin_l,r=pin_d/2);
        rotate([90,0,0]) translate([0,0,pin_l]) rotate([0,180,0]) pinhole(h=pin_l,r=pin_d/2);
    }
    scale([1,1.3,1]) 
    translate([0,0,pin_d/2]) rotate([0,90,0]) pinhole(h=pin_l/2,r=pin_d/2);
}



////////////////////// PINS imbedded here ///////////////////////////

// Pin Connectors V3
// Tony Buser <tbuser@gmail.com>
// Modified by Emmett Lalish

length=20;
diameter=8;
//Only affects pinhole
hole_twist=0;//[0:free,1:fixed]
//Only affects pinhole
hole_friction=0;//[0:loose,1:tight]
//Radial gap to help pins fit into tight holes
pin_tolerance=0.2;
//Extra gap to make loose hole
loose=0.3;
lip_height=3;
lip_thickness=1;
hf=hole_friction==0 ? false : true;
ht=hole_twist==0 ? false : true;


module pinhole(h=10, r=4, lh=3, lt=1, t=0.3, tight=true, fixed=false) {
  // h = shaft height
  // r = shaft radius
  // lh = lip height
  // lt = lip thickness
  // t = extra tolerance for loose fit
  // tight = set to false if you want a joint that spins easily
  // fixed = set to true so pins can't spin
  
intersection(){
  union() {
	if (tight == true || fixed == true) {
      pin_solid(h, r, lh, lt);
	  translate([0,0,-t/2])cylinder(h=h+t, r=r, $fn=30);
	} else {
	  pin_solid(h, r+t/2, lh, lt);
	  translate([0,0,-t/2])cylinder(h=h+t, r=r+t/2, $fn=30);
	}
    
    
    // widen the entrance hole to make insertion easier
    //translate([0, 0, -0.1]) cylinder(h=lh/3, r2=r, r1=r+(t/2)+(lt/2),$fn=30);
  }
  if (fixed == true) {
	translate([-r*2, -r*0.75, -1])cube([r*4, r*1.5, h+2]);
  }
}}

module pin(h=10, r=4, lh=3, lt=1, t=0.2, side=false) {
  // h = shaft height
  // r = shaft radius
  // lh = lip height
  // lt = lip thickness
  // side = set to true if you want it printed horizontally

  if (side) {
    pin_horizontal(h, r, lh, lt, t);
  } else {
    pin_vertical(h, r, lh, lt, t);
  }
}

module pintack(h=10, r=4, lh=3, lt=1, t=0.2, bh=3, br=8.75) {
  // bh = base_height
  // br = base_radius
  
  union() {
    cylinder(h=bh, r=br);
    translate([0, 0, bh]) pin(h, r, lh, lt, t);
  }
}

module pinpeg(h=20, r=4, lh=3, lt=1, t=0.2) {
  union() {
    translate([0,-0.05, 0]) pin(h/2+0.1, r, lh, lt, t, side=true);
    translate([0,0.05, 0]) rotate([0, 0, 180]) pin(h/2+0.1, r, lh, lt, t, side=true);
  }
}

// just call pin instead, I made this module because it was easier to do the rotation option this way
// since openscad complains of recursion if I did it all in one module
module pin_vertical(h=10, r=4, lh=3, lt=1, t=0.2) {
  // h = shaft height
  // r = shaft radius
  // lh = lip height
  // lt = lip thickness

  difference() {
    pin_solid(h, r-t/2, lh, lt);
    
    // center cut
    translate([-lt*3/2, -(r*2+lt*2)/2, h/2+lt*3/2]) cube([lt*3, r*2+lt*2, h]);
    //translate([0, 0, h/4]) cylinder(h=h+lh, r=r/2.5, $fn=20);
    // center curve
    translate([0, 0, h/2+lt*3/2]) rotate([90, 0, 0]) cylinder(h=r*2, r=lt*3/2, center=true, $fn=20);
  
    // side cuts
    translate([-r*2, -r-r*0.75+t/2, -1]) cube([r*4, r, h+2]);
    translate([-r*2, r*0.75-t/2, -1]) cube([r*4, r, h+2]);
  }
}

// call pin with side=true instead of this
module pin_horizontal(h=10, r=4, lh=3, lt=1, t=0.2) {
  // h = shaft height
  // r = shaft radius
  // lh = lip height
  // lt = lip thickness
  translate([0, 0, r*0.75-t/2]) rotate([-90, 0, 0]) pin_vertical(h, r, lh, lt, t);
}

// this is mainly to make the pinhole module easier
module pin_solid(h=10, r=4, lh=3, lt=1) {
  union() {
    // shaft
    cylinder(h=h-lh, r=r, $fn=30);
    // lip
    // translate([0, 0, h-lh]) cylinder(h=lh*0.25, r1=r, r2=r+(lt/2), $fn=30);
    // translate([0, 0, h-lh+lh*0.25]) cylinder(h=lh*0.25, r2=r, r1=r+(lt/2), $fn=30);
    // translate([0, 0, h-lh+lh*0.50]) cylinder(h=lh*0.50, r1=r, r2=r-(lt/2), $fn=30);

    // translate([0, 0, h-lh]) cylinder(h=lh*0.50, r1=r, r2=r+(lt/2), $fn=30);
    // translate([0, 0, h-lh+lh*0.50]) cylinder(h=lh*0.50, r1=r+(lt/2), r2=r-(lt/3), $fn=30);    

    translate([0, 0, h-lh]) cylinder(h=lh*0.25, r1=r, r2=r+(lt/2), $fn=30);
    translate([0, 0, h-lh+lh*0.25]) cylinder(h=lh*0.25, r=r+(lt/2), $fn=30);    
    translate([0, 0, h-lh+lh*0.50]) cylinder(h=lh*0.50, r1=r+(lt/2), r2=r-(lt/2), $fn=30);    

    // translate([0, 0, h-lh]) cylinder(h=lh, r1=r+(lt/2), r2=1, $fn=30);
    // translate([0, 0, h-lh-lt/2]) cylinder(h=lt/2, r1=r, r2=r+(lt/2), $fn=30);
  }
}

module pinshaft(h=10, r=4, t=0.2, side=false){
flip=side ? 1 : 0;
translate(flip*[0,h/2,r*0.75-t/2])rotate(flip*[90,0,0])
intersection(){
	cylinder(h=h, r=r-t/2, $fn=30);
	translate([-r*2, -r*0.75+t/2, -1])cube([r*4, r*1.5-t, h+2]);
}
}
